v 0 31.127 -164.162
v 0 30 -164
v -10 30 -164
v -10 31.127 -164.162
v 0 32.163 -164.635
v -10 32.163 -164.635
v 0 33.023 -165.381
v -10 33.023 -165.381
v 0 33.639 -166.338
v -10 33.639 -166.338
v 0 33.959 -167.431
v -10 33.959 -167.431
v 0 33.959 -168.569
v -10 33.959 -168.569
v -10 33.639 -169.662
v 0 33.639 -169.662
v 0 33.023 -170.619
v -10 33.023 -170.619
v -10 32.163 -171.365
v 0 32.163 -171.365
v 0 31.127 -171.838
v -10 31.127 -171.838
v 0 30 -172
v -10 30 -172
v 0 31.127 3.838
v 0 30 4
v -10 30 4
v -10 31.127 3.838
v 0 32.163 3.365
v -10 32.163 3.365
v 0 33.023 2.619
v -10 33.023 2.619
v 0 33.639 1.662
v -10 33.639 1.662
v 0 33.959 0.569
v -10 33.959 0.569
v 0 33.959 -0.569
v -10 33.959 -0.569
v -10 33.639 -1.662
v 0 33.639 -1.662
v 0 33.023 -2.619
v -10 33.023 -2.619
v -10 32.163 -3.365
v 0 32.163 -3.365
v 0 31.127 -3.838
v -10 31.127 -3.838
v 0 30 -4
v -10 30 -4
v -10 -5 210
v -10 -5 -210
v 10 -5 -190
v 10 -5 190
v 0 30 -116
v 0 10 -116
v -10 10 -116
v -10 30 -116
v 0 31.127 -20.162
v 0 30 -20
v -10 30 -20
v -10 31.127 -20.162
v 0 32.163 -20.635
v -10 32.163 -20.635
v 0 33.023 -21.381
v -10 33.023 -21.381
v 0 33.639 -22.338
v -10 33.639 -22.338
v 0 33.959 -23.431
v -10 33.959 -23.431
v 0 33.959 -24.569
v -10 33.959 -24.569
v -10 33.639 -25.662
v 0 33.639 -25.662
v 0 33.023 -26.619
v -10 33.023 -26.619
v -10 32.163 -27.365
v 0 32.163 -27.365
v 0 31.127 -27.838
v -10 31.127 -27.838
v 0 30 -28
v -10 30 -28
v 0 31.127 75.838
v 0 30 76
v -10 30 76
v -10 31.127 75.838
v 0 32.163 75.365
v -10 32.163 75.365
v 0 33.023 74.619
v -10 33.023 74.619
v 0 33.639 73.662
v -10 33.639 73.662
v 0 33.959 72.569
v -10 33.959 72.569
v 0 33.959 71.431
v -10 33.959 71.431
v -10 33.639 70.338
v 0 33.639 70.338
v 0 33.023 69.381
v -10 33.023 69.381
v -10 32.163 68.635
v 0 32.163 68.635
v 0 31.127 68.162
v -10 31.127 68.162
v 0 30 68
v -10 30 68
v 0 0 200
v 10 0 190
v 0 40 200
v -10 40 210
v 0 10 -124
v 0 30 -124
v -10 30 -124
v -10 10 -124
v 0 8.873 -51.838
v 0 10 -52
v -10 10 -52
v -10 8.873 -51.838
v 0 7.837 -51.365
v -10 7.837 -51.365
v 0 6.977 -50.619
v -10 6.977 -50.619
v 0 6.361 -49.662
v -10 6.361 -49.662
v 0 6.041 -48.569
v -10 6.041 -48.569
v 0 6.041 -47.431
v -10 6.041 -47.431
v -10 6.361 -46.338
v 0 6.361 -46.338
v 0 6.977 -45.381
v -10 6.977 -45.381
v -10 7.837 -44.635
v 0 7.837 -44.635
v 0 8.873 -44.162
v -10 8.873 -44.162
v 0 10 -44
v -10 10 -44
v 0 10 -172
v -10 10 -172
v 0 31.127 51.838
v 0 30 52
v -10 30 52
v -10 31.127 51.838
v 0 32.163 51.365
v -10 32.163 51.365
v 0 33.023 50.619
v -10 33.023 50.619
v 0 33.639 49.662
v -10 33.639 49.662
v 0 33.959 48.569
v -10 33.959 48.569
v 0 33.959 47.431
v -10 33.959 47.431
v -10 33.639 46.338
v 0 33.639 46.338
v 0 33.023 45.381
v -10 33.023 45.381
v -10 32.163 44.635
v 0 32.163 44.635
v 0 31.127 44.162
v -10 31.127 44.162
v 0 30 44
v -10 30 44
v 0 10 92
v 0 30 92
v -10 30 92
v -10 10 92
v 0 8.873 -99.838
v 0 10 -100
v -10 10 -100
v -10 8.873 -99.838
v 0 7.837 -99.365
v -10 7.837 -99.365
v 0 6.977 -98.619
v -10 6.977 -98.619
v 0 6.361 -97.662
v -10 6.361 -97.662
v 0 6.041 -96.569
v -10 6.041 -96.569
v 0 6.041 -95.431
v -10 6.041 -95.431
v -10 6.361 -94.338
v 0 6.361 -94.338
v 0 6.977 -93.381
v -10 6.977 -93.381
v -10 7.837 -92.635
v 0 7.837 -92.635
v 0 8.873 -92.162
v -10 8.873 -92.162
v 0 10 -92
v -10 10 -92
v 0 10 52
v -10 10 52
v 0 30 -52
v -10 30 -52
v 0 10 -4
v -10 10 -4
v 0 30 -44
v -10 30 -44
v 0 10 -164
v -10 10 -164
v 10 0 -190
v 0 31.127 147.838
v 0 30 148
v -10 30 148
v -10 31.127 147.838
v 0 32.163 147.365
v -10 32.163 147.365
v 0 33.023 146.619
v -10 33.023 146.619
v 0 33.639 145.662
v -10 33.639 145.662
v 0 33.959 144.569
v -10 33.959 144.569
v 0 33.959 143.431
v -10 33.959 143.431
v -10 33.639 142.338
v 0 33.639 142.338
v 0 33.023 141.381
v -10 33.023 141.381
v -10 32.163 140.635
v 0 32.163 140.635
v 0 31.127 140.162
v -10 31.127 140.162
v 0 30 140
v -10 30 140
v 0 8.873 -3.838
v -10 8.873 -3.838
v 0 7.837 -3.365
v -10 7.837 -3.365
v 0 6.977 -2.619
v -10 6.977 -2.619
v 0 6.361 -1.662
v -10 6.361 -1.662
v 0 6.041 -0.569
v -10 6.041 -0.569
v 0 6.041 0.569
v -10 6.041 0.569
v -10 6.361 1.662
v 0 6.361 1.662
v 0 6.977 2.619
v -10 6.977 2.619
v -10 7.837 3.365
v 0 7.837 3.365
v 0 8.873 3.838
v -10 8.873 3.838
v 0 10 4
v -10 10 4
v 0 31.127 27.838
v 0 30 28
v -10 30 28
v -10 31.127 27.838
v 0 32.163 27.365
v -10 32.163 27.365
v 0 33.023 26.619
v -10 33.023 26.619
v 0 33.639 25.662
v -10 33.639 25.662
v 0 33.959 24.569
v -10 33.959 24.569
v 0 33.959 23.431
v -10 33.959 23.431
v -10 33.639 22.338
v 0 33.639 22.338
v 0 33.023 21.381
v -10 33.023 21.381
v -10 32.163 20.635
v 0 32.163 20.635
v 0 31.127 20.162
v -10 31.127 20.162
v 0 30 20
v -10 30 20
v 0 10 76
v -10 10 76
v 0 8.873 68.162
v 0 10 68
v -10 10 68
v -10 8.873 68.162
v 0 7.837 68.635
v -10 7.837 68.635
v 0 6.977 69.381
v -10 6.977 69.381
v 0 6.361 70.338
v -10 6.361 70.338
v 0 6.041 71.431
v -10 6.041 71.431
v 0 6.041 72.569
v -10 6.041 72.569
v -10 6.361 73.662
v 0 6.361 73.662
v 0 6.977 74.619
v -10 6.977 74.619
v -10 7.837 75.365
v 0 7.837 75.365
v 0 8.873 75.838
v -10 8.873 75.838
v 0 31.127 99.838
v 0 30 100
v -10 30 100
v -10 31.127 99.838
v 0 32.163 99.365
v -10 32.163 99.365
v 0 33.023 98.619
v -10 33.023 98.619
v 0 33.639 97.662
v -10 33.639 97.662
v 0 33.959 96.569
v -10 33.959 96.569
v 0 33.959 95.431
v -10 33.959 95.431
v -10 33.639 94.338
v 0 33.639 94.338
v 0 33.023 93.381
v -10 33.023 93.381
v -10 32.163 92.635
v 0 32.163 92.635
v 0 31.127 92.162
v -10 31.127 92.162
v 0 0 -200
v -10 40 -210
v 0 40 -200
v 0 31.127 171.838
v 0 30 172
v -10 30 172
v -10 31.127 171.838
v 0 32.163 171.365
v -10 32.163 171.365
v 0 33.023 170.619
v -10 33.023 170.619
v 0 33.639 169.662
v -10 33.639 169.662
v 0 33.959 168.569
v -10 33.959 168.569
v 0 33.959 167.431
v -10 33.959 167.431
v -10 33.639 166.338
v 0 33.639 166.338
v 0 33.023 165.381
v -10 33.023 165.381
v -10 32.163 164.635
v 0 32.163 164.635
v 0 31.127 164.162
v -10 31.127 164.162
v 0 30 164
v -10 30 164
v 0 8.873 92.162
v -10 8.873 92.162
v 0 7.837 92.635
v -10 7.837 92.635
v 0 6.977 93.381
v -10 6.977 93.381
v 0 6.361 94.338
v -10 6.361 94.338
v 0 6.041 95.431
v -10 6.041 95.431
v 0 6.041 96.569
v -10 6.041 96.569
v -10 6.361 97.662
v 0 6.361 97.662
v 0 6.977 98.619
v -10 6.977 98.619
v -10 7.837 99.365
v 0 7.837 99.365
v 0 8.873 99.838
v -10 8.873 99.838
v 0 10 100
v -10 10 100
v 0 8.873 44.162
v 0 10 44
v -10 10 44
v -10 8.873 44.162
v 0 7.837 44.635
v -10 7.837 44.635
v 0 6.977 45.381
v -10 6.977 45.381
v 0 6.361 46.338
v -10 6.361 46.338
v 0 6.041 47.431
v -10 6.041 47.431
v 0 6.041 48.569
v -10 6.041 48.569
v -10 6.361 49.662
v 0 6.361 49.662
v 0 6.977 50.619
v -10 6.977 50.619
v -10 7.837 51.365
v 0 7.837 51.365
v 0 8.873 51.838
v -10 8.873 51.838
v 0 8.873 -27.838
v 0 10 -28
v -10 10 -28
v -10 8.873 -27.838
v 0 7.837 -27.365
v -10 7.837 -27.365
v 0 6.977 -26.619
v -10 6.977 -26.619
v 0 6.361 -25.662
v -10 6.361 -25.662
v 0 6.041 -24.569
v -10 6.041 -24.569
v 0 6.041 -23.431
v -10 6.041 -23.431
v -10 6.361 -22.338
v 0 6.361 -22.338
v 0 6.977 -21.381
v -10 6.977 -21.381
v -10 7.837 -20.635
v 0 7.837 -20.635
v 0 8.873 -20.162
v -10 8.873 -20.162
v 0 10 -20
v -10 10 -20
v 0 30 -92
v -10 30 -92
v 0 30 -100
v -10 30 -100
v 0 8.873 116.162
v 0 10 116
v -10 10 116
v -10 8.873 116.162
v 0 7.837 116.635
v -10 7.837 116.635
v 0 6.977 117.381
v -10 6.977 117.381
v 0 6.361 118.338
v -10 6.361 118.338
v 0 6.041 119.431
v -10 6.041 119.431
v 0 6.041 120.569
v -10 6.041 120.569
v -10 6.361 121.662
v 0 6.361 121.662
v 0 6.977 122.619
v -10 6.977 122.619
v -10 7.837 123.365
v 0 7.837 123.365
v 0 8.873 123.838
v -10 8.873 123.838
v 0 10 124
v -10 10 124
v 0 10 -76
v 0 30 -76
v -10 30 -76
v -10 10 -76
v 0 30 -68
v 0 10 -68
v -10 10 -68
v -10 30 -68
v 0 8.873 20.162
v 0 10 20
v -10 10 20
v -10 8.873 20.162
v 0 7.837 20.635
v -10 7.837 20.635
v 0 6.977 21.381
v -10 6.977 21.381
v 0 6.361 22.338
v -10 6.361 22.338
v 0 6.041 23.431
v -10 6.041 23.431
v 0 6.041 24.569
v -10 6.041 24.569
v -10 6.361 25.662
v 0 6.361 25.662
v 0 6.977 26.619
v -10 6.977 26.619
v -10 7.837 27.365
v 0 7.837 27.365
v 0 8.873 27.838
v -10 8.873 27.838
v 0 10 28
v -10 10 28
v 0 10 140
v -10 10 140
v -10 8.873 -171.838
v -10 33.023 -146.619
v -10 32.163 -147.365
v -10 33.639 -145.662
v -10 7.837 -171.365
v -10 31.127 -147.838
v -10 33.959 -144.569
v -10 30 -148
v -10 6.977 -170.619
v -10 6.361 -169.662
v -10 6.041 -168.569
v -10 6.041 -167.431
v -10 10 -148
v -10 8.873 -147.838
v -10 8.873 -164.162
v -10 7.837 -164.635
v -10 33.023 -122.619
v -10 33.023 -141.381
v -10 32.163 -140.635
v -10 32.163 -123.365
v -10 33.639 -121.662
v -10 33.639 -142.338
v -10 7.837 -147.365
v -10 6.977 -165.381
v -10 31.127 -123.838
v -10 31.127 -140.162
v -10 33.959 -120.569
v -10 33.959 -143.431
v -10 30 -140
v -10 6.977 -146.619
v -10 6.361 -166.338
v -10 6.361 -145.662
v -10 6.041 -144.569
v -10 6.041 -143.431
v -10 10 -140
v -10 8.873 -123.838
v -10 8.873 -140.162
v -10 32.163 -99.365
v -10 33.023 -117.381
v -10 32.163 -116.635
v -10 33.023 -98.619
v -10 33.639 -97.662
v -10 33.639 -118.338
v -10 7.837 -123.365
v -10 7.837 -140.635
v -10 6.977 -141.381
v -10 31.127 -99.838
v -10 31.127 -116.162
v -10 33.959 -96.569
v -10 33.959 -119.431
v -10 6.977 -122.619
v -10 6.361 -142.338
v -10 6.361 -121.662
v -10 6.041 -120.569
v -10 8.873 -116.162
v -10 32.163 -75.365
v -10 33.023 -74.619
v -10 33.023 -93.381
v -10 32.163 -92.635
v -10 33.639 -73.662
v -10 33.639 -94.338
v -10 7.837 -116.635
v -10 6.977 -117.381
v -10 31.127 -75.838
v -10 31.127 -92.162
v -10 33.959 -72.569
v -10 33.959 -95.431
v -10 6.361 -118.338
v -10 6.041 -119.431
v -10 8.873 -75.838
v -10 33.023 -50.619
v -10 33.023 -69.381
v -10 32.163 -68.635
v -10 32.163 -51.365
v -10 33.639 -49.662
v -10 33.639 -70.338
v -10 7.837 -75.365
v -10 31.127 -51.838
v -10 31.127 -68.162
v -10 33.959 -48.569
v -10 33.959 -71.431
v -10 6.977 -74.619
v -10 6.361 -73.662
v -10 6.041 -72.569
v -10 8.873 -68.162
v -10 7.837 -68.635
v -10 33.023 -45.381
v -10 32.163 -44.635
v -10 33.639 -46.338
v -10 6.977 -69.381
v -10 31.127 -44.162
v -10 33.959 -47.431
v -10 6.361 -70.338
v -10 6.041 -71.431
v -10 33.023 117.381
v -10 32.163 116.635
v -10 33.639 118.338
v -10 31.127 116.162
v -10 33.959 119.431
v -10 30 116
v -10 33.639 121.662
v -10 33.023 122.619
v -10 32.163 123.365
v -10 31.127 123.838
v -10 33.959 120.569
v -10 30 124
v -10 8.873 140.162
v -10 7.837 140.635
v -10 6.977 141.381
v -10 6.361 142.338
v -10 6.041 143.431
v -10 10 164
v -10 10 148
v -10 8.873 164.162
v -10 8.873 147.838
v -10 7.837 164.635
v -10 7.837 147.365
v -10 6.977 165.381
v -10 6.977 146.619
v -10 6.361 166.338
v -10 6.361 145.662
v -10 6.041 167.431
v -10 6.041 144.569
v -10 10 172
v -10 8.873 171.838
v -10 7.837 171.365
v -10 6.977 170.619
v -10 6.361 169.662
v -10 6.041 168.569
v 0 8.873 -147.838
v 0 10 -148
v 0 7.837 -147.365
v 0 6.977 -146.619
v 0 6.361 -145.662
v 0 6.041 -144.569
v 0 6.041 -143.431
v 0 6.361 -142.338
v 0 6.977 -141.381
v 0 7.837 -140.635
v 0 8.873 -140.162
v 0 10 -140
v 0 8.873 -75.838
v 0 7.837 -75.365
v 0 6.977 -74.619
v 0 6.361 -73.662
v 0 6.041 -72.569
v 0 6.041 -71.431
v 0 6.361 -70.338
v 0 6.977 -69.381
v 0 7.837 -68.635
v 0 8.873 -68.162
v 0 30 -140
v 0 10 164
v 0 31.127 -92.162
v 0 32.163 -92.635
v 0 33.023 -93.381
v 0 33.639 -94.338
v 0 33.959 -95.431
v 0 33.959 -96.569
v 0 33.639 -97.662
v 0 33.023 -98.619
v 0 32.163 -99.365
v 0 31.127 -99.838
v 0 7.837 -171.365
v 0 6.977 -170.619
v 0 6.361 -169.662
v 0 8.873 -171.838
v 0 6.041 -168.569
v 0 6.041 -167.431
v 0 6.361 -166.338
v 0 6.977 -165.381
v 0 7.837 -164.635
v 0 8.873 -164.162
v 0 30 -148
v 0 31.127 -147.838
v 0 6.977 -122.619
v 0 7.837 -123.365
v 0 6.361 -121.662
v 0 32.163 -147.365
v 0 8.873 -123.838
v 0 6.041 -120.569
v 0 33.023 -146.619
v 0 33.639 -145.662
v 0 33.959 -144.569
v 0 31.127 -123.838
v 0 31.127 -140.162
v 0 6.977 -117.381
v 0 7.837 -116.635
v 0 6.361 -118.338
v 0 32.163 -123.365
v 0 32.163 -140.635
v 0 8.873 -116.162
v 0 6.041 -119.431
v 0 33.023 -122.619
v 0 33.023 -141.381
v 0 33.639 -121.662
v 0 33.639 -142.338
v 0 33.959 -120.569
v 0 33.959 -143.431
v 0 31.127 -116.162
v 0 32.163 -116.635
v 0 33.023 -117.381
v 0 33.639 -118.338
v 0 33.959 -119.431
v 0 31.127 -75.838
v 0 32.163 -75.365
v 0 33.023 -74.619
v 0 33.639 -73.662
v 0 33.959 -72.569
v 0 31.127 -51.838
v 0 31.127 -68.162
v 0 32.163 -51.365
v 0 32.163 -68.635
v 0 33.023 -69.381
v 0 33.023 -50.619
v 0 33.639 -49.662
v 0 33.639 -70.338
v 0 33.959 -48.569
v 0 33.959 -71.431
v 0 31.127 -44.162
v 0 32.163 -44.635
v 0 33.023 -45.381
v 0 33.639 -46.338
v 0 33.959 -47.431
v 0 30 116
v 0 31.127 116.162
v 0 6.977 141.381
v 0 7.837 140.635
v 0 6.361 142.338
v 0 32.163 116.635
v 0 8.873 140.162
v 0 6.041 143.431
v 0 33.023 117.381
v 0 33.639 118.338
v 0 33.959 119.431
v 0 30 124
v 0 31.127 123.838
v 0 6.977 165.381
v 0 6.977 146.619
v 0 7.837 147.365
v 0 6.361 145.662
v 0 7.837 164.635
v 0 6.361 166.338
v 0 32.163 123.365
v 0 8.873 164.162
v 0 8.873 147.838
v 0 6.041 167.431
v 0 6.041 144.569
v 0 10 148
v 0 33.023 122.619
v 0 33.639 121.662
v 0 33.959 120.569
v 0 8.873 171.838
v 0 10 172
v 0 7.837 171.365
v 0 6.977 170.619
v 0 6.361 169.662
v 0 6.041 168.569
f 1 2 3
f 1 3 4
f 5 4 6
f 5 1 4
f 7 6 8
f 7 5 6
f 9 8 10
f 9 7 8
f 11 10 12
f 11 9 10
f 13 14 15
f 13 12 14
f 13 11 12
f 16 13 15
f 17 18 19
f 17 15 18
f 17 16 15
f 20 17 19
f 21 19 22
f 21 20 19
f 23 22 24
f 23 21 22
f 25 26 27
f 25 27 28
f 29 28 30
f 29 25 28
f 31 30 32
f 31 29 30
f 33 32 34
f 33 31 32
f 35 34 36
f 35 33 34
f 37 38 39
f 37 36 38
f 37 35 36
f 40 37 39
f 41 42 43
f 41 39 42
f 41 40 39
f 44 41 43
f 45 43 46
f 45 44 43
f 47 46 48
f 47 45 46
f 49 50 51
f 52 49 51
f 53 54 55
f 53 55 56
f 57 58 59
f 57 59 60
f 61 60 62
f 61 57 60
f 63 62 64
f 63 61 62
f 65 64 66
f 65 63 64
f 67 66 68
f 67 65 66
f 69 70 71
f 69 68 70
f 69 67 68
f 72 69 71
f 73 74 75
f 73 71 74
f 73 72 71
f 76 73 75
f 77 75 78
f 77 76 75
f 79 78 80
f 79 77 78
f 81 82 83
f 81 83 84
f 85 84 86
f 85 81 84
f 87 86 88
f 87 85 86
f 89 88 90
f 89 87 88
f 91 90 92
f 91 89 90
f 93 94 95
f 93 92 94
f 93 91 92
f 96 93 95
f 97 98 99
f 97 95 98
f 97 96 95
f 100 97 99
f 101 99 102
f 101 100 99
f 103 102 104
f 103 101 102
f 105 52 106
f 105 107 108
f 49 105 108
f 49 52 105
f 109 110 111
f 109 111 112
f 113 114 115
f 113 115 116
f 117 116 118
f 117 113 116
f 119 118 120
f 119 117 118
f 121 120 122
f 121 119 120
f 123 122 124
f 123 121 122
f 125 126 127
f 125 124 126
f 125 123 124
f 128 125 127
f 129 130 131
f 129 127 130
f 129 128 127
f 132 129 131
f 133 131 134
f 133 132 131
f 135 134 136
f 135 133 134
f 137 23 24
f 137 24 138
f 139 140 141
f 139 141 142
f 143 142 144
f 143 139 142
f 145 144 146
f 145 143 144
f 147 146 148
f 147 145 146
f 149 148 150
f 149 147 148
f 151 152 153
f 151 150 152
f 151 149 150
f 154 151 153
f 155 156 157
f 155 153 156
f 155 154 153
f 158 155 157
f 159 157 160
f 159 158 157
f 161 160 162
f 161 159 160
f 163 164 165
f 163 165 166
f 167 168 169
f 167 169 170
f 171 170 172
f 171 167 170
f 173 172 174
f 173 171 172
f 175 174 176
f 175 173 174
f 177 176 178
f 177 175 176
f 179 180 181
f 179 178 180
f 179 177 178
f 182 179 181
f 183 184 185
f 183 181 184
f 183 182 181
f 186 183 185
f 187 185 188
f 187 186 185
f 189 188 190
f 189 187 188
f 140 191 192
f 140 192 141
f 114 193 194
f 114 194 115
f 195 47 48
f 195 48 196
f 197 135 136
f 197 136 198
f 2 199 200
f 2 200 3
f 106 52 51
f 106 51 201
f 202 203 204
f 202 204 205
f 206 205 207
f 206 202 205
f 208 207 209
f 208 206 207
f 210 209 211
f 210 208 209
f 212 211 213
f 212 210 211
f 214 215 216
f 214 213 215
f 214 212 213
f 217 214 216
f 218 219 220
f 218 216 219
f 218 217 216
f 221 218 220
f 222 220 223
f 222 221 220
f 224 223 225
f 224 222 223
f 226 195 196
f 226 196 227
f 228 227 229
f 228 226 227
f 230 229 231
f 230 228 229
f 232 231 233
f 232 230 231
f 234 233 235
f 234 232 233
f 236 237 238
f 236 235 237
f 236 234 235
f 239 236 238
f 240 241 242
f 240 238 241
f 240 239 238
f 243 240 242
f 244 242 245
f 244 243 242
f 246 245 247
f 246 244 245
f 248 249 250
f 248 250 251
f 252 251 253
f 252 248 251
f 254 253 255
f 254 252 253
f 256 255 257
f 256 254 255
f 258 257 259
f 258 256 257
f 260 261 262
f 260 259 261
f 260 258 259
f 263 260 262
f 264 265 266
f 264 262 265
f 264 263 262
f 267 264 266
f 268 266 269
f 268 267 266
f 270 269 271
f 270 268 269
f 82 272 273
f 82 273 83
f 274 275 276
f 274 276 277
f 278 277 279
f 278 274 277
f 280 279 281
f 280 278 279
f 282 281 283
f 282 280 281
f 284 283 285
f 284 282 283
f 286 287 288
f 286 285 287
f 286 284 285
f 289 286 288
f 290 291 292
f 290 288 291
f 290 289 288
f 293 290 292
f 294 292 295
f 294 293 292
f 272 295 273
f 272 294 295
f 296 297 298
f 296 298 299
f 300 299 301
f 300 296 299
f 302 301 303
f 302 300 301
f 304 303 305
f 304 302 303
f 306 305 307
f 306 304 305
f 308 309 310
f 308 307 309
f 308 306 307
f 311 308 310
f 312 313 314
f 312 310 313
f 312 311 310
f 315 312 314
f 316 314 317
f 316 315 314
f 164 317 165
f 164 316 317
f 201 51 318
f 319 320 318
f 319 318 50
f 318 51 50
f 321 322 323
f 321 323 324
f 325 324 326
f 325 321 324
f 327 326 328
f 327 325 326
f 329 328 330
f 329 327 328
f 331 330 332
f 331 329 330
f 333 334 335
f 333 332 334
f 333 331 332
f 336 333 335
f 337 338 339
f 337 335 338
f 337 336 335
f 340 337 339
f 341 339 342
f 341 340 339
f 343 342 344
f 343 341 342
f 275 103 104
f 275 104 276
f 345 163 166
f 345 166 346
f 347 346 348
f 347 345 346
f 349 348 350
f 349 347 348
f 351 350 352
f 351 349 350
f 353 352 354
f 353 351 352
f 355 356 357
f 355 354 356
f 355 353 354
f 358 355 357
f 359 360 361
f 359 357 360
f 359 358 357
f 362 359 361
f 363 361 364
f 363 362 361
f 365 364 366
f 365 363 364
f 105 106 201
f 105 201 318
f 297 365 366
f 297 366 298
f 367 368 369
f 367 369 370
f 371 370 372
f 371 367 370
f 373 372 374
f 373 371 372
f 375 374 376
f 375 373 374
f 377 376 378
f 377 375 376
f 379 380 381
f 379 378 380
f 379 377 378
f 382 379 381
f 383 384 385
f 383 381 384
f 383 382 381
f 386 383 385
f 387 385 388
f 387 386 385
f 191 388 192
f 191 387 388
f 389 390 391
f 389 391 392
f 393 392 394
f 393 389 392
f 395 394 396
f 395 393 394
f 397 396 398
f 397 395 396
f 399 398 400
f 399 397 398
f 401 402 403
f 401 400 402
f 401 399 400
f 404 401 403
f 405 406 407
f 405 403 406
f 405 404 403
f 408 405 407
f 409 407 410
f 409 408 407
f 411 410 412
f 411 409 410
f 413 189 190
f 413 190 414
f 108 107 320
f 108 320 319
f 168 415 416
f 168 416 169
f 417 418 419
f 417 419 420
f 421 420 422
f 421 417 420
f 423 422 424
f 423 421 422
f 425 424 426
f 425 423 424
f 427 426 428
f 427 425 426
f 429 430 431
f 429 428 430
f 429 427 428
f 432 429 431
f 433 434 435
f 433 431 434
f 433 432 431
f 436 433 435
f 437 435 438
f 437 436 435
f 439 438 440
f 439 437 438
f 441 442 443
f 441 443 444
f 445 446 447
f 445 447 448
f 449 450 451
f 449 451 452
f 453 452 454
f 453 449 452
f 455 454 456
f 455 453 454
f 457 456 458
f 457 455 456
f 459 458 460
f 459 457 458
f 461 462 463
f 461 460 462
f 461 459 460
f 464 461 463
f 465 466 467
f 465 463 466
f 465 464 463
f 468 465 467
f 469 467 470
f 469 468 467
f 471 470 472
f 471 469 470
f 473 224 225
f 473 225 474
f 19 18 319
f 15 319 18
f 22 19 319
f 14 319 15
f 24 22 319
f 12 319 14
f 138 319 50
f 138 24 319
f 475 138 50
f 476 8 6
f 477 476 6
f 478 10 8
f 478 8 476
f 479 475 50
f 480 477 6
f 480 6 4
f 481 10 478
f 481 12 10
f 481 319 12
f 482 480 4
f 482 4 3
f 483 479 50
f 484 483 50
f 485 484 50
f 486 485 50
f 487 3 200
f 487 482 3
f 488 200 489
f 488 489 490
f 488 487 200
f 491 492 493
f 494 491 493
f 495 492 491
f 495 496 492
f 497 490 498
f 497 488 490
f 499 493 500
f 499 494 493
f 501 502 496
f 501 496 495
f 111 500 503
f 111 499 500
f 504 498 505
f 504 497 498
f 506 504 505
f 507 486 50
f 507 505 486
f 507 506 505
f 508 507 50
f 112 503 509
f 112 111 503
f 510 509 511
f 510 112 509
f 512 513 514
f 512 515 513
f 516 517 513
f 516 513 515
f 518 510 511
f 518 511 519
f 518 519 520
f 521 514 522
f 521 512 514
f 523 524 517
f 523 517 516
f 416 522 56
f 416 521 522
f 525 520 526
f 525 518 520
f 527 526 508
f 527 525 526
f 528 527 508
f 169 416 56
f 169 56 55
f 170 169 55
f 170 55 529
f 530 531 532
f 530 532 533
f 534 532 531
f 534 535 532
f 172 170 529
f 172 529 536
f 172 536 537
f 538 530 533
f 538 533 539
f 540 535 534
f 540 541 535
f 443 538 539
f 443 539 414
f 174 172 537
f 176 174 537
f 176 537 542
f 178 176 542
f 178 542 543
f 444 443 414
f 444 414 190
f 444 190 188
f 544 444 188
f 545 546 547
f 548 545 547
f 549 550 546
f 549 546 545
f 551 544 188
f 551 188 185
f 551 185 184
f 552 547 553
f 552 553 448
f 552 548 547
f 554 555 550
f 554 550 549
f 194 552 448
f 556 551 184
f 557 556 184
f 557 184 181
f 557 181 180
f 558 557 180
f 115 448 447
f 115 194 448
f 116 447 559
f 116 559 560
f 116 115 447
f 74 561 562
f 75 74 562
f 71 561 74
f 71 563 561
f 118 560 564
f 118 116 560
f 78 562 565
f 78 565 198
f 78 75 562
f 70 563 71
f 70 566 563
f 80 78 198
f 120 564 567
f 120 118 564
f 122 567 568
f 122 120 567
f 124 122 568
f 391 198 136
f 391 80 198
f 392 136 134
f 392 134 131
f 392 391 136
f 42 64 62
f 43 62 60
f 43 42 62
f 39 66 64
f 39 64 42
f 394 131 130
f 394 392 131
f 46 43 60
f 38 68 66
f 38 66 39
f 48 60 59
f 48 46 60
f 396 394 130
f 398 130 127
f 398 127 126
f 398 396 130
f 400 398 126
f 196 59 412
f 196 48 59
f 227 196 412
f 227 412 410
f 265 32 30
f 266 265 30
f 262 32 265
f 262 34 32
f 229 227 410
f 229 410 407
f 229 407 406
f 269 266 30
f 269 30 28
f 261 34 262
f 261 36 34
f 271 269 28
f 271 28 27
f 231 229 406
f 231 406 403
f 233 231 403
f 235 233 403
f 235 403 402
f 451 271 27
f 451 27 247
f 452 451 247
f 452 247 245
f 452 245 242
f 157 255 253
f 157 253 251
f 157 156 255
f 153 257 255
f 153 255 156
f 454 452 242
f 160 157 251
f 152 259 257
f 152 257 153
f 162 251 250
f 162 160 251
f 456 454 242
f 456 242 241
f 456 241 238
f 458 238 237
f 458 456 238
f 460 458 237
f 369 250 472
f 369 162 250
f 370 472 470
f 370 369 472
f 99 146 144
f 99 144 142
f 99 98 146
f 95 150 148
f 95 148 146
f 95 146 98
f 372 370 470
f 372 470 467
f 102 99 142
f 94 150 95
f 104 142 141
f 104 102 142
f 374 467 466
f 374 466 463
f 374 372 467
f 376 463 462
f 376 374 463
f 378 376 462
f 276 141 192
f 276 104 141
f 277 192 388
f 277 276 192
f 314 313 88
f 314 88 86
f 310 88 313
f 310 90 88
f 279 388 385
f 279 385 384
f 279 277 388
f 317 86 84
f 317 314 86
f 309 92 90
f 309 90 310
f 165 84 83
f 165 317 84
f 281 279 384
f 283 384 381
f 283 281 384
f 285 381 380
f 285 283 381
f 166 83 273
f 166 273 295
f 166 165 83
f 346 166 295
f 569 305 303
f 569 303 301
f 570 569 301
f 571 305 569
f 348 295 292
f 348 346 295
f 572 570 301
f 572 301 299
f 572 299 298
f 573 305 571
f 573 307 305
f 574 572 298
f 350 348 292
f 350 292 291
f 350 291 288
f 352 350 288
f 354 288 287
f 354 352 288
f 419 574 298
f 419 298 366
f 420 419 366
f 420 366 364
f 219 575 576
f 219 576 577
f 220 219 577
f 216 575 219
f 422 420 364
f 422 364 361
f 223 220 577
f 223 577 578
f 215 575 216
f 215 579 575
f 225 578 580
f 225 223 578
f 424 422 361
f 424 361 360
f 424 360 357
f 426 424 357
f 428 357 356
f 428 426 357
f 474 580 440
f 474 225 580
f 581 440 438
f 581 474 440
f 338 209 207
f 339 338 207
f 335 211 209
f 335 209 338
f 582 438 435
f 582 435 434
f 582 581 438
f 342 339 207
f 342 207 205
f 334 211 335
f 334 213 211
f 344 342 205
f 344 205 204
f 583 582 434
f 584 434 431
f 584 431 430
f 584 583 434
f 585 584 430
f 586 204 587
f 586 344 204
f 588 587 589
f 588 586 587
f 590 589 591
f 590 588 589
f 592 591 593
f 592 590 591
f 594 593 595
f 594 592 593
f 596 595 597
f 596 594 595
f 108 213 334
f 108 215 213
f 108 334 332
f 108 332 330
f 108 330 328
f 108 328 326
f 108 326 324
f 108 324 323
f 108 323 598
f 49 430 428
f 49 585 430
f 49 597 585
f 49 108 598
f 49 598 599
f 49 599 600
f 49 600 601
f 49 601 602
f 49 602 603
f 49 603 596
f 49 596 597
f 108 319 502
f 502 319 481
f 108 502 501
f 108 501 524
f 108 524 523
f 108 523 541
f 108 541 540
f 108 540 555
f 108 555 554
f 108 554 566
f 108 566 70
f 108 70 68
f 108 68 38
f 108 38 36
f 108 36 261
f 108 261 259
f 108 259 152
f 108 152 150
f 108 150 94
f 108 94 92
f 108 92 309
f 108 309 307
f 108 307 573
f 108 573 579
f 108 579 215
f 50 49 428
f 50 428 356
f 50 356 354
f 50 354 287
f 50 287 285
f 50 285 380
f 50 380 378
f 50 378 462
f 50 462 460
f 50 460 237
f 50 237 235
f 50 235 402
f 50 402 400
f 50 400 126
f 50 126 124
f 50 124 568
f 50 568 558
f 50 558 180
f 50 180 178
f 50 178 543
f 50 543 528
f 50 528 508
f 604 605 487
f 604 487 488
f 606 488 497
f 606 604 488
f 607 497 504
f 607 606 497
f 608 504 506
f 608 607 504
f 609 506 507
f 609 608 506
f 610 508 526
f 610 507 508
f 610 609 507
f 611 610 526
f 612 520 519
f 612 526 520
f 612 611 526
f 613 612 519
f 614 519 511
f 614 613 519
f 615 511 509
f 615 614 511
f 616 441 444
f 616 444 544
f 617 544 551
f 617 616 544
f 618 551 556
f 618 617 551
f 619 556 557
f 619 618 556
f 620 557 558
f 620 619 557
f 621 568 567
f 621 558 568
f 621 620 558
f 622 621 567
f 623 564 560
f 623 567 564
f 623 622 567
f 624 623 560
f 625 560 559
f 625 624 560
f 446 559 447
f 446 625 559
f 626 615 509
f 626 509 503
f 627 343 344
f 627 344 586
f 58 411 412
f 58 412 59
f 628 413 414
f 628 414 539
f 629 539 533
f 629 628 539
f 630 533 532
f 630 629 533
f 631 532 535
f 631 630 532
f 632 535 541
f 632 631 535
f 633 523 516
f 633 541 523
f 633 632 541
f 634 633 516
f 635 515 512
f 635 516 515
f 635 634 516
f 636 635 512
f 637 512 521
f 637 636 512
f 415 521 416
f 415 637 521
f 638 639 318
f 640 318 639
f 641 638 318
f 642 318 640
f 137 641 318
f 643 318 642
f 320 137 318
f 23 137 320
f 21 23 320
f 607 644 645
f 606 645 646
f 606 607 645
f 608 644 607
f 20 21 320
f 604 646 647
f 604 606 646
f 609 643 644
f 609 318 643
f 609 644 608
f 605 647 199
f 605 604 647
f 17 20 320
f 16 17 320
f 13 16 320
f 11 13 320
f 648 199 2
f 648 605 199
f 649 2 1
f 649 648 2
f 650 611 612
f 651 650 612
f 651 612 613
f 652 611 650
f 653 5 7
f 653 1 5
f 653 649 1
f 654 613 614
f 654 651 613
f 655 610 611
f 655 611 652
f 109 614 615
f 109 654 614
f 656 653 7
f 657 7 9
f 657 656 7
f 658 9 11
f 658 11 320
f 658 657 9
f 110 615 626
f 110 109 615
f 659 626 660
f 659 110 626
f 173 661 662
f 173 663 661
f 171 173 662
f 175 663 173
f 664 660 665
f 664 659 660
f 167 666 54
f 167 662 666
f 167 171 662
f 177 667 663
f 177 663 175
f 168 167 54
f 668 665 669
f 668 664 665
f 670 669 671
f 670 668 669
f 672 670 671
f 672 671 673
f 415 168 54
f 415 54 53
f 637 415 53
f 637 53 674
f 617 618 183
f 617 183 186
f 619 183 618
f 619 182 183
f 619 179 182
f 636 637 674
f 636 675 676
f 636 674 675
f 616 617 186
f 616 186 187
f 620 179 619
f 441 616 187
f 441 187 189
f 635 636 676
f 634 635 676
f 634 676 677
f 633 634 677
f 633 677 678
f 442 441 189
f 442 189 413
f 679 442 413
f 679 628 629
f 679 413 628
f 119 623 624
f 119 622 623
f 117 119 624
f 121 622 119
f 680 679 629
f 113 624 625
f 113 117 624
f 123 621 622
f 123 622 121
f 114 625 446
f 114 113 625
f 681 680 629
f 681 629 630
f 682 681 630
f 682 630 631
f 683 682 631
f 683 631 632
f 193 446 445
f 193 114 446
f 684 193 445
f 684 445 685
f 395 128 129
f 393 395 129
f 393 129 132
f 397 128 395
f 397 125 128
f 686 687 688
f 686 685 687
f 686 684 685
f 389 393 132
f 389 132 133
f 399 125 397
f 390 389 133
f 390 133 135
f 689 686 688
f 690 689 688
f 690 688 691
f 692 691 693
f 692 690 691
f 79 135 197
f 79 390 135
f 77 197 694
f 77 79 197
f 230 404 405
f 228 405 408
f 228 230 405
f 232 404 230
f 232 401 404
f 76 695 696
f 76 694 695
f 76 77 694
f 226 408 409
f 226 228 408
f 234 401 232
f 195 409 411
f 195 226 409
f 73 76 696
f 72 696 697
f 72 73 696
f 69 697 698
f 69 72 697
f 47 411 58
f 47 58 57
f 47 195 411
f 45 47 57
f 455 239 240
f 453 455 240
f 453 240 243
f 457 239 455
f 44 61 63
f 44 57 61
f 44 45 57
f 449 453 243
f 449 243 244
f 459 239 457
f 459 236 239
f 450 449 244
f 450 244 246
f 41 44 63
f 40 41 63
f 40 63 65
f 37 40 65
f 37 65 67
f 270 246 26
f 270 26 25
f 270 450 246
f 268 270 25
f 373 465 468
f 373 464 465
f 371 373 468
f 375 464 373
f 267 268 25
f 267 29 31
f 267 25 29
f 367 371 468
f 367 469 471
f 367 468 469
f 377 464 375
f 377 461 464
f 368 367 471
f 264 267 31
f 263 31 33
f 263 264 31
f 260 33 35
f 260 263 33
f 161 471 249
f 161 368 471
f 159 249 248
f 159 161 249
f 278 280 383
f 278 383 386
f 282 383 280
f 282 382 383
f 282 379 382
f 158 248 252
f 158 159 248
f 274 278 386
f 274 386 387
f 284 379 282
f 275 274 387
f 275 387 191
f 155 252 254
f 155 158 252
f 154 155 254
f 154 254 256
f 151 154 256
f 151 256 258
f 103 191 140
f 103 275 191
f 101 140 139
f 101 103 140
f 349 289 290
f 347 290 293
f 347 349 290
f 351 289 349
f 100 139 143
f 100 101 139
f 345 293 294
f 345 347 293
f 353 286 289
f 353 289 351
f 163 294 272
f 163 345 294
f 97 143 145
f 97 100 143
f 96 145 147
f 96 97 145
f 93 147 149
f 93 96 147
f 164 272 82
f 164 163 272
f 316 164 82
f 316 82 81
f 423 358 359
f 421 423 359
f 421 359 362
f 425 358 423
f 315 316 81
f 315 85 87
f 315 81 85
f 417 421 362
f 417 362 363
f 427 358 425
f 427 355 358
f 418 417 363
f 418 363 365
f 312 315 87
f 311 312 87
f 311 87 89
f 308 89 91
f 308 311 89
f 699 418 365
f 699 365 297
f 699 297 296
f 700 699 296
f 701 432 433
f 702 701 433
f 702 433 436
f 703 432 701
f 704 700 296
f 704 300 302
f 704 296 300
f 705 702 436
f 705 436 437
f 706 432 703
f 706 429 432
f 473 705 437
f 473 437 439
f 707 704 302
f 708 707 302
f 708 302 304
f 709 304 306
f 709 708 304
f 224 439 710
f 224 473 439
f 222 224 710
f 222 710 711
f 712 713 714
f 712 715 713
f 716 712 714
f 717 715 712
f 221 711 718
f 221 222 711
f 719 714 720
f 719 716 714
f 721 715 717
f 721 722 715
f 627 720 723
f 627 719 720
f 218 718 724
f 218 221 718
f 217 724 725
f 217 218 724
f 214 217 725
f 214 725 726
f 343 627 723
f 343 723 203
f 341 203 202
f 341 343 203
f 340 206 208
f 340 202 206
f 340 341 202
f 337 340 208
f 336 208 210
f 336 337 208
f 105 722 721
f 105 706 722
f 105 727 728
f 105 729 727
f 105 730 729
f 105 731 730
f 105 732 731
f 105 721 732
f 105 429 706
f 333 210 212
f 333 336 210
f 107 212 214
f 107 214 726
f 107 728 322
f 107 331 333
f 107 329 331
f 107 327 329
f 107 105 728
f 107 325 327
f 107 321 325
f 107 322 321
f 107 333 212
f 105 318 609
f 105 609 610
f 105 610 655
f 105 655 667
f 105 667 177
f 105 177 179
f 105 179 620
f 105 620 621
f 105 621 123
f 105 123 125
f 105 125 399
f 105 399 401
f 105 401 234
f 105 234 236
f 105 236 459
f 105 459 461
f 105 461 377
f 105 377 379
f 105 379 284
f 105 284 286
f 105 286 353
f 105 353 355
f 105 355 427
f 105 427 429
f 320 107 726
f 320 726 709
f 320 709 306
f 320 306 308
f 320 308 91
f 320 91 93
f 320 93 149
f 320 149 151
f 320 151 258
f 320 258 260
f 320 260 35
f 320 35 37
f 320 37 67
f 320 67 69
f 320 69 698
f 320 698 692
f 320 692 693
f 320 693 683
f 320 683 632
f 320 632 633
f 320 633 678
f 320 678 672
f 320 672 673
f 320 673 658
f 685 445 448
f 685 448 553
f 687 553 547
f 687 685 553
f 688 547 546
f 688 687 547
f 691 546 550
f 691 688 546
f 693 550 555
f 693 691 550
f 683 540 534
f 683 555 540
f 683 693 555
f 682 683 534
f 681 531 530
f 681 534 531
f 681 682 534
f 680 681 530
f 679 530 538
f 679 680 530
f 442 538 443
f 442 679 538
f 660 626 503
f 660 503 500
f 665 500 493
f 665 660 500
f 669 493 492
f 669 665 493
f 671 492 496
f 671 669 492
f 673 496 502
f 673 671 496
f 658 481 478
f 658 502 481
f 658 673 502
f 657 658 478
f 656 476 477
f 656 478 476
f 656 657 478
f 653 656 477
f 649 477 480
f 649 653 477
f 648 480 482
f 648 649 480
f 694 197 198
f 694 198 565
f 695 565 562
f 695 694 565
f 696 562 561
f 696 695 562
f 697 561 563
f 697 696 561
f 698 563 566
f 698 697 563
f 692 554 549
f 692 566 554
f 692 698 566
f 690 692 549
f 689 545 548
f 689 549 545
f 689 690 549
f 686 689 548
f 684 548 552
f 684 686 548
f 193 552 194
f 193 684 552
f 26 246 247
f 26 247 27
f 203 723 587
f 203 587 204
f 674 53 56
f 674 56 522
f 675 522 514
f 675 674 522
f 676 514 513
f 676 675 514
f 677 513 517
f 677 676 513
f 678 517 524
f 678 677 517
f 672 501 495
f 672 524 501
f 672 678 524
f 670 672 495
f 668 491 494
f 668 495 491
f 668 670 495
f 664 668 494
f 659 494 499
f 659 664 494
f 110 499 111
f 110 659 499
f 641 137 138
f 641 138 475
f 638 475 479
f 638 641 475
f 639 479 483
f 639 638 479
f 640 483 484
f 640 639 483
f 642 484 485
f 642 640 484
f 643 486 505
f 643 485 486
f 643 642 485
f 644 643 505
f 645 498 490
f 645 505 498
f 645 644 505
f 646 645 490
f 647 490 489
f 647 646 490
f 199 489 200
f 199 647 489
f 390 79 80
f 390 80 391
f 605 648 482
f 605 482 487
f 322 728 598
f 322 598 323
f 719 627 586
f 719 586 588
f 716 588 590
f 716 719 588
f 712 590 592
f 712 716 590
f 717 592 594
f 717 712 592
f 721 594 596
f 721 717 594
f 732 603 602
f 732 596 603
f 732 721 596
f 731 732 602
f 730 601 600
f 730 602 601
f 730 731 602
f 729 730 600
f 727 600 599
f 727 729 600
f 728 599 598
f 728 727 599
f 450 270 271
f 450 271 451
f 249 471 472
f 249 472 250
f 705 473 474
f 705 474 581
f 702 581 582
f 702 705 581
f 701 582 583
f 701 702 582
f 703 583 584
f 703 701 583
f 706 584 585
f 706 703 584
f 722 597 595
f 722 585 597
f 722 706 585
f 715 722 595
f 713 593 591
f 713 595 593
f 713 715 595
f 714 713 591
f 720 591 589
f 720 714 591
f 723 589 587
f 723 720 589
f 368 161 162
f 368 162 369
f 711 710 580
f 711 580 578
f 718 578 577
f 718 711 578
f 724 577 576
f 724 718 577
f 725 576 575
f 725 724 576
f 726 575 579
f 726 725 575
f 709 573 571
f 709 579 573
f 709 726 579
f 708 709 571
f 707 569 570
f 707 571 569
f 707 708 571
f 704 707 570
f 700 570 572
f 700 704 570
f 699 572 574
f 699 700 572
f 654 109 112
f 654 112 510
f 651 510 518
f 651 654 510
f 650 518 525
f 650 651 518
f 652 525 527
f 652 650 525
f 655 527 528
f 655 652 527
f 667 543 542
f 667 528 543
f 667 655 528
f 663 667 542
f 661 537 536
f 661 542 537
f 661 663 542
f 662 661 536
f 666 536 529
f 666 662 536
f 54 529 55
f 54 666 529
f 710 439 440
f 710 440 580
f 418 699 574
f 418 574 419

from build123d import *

# Parameters (mm, degrees)
BOSS_EXTRU_1_DEPTH             = 300
ENL_V_MAT_EXTRU_1_DEPTH        = 304.521004216
ENL_V_MAT_EXTRU_2_DEPTH        = 215.00934559
R_P_TITION_LIN_AIRE1_COUNT     = 8
R_P_TITION_LIN_AIRE1_PITCH     = 24
R_P_TITION_LIN_AIRE1_COL_COUNT = 8
R_P_TITION_LIN_AIRE1_COL_PITCH = 24


with BuildPart() as part:
    # Esquisse1 → Boss.-Extru.1 (new, symmetric)
    with BuildSketch(Plane.XY):
        Polygon((-10, 40), (-10, -5), (10, -5), (10, 0), (0, 0), (0, 40), align=None)
    extrude(amount=BOSS_EXTRU_1_DEPTH, both=True)

    # Esquisse2 → Enlèv. mat.-Extru.1 (cut, symmetric)
    with BuildSketch(Plane.XZ.offset(5)):
        Polygon((10, 190), (-10, 210), (-10, 300), (10, 300), align=None)
    enl_v_mat_extru_1 = extrude(amount=ENL_V_MAT_EXTRU_1_DEPTH, both=True, mode=Mode.SUBTRACT)

    # Symétrie1: Enlèv. mat.-Extru.1 across plane
    add(enl_v_mat_extru_1.mirror(Plane.XY), mode=Mode.SUBTRACT)

    # Esquisse3 → Enlèv. mat.-Extru.2 (cut, symmetric)
    with BuildSketch(Plane(origin=(0, 0, 0), x_dir=(0, 0, -1), z_dir=(1, 0, 0))):
        with BuildLine():
            Line((-4, 10), (-4, 30))
            ThreePointArc((-4, 30), (0, 34), (4, 30))
            Line((4, 30), (4, 10))
            ThreePointArc((4, 10), (0, 6), (-4, 10))
        make_face()
    enl_v_mat_extru_2 = extrude(amount=ENL_V_MAT_EXTRU_2_DEPTH, both=True, mode=Mode.SUBTRACT)

    # Répétition linéaire1: Enlèv. mat.-Extru.2 ×8
    with Locations(*[(0, 0, i * R_P_TITION_LIN_AIRE1_PITCH) for i in range(1, R_P_TITION_LIN_AIRE1_COUNT)]):
        add(enl_v_mat_extru_2, mode=Mode.SUBTRACT)

    # Répétition linéaire1 col: Enlèv. mat.-Extru.2 ×8
    with Locations(*[(0, 0, -i * R_P_TITION_LIN_AIRE1_COL_PITCH) for i in range(1, R_P_TITION_LIN_AIRE1_COL_COUNT)]):
        add(enl_v_mat_extru_2, mode=Mode.SUBTRACT)


solid = part.part
